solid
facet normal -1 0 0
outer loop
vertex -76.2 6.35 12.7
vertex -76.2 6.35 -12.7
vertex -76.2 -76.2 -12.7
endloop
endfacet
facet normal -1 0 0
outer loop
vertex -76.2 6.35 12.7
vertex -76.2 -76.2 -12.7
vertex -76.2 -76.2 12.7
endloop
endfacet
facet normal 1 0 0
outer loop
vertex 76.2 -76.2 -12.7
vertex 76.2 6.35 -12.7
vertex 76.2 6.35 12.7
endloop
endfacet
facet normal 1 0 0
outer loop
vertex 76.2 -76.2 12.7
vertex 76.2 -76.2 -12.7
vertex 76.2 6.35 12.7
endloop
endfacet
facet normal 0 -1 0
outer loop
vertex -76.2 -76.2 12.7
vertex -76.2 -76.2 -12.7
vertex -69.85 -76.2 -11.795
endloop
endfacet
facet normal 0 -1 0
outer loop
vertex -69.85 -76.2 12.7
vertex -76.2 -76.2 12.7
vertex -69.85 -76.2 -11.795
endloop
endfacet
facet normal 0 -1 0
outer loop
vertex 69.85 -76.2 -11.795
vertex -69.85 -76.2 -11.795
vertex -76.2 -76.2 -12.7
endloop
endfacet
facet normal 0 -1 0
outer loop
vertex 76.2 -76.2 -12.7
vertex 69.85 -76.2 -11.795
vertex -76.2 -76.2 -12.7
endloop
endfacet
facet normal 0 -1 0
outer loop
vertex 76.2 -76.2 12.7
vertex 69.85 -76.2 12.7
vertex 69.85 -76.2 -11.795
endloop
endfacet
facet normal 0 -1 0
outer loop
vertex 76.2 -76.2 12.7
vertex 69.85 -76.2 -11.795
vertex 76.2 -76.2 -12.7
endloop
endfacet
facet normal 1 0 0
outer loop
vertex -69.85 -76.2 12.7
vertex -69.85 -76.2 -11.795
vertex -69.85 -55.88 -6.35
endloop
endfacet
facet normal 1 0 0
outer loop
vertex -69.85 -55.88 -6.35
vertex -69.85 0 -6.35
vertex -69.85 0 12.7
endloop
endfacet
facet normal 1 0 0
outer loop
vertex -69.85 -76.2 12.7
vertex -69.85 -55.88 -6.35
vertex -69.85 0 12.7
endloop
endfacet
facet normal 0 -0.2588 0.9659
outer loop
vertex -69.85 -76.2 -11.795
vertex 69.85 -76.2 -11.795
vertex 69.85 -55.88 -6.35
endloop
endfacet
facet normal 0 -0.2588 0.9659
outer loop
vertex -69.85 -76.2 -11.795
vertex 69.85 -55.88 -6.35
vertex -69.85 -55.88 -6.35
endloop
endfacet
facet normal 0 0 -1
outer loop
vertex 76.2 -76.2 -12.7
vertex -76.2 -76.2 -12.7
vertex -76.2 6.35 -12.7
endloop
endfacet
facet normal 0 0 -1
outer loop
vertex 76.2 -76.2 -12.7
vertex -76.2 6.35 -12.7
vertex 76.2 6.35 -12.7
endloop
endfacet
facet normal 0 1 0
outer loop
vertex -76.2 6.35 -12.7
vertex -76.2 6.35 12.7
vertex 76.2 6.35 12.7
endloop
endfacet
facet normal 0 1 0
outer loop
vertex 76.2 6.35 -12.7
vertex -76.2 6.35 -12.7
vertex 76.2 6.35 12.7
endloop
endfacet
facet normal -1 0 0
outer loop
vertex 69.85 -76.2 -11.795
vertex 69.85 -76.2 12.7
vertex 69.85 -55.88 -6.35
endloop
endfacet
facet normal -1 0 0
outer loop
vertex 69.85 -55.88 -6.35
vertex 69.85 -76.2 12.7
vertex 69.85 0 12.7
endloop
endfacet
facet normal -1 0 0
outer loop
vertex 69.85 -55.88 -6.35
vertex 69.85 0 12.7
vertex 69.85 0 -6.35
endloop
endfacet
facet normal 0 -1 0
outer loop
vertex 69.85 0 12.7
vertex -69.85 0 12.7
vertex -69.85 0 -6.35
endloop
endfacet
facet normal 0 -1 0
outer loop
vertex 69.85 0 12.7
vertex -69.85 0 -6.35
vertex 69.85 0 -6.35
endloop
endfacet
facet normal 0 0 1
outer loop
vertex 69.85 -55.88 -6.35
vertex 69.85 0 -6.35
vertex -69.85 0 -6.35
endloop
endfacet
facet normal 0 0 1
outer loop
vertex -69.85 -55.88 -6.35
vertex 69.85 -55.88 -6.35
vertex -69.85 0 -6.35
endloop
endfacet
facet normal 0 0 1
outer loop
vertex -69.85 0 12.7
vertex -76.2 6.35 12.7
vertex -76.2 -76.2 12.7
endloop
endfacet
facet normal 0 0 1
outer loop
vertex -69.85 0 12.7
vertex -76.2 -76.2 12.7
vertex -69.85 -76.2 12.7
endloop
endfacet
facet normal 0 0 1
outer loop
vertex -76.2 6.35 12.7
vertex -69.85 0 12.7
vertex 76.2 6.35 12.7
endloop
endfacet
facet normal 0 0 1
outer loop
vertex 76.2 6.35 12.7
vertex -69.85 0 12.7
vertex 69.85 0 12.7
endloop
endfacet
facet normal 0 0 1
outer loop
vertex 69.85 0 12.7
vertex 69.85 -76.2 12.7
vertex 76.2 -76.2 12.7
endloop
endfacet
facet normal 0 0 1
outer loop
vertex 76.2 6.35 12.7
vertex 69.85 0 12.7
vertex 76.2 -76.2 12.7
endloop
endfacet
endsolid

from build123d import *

# Parameters (mm, degrees)
F1_DEPTH = 76.2
F2_SIZE2 = 5.444728
F2_SIZE  = 20.32
F3_W     = 152.4
F3_H     = 25.4
F4_DEPTH = 6.35


with BuildPart() as f1:
    # F0 (on Front) → F1 (new body)
    with BuildSketch(Plane.XZ):
        Polygon((69.85, -12.7), (76.2, -12.7), (76.2, 12.7), (69.85, 12.7), (69.85, -6.35), (-69.85, -6.35), (-69.85, 12.7), (-76.2, 12.7), (-76.2, -6.35), (-76.2, -12.7), align=None)
    extrude(amount=F1_DEPTH)

    # F2
    f2_edges = [f1.edges().sort_by_distance(p)[0] for p in [
        (0, -76.2, -6.35),
    ]]
    chamfer(f2_edges, length=F2_SIZE, length2=F2_SIZE2)

    # F3 (on Front) → F4 (join)
    with BuildSketch(Plane.XZ):
        Rectangle(F3_W, F3_H)
    extrude(amount=-F4_DEPTH)


solid = f1.part
